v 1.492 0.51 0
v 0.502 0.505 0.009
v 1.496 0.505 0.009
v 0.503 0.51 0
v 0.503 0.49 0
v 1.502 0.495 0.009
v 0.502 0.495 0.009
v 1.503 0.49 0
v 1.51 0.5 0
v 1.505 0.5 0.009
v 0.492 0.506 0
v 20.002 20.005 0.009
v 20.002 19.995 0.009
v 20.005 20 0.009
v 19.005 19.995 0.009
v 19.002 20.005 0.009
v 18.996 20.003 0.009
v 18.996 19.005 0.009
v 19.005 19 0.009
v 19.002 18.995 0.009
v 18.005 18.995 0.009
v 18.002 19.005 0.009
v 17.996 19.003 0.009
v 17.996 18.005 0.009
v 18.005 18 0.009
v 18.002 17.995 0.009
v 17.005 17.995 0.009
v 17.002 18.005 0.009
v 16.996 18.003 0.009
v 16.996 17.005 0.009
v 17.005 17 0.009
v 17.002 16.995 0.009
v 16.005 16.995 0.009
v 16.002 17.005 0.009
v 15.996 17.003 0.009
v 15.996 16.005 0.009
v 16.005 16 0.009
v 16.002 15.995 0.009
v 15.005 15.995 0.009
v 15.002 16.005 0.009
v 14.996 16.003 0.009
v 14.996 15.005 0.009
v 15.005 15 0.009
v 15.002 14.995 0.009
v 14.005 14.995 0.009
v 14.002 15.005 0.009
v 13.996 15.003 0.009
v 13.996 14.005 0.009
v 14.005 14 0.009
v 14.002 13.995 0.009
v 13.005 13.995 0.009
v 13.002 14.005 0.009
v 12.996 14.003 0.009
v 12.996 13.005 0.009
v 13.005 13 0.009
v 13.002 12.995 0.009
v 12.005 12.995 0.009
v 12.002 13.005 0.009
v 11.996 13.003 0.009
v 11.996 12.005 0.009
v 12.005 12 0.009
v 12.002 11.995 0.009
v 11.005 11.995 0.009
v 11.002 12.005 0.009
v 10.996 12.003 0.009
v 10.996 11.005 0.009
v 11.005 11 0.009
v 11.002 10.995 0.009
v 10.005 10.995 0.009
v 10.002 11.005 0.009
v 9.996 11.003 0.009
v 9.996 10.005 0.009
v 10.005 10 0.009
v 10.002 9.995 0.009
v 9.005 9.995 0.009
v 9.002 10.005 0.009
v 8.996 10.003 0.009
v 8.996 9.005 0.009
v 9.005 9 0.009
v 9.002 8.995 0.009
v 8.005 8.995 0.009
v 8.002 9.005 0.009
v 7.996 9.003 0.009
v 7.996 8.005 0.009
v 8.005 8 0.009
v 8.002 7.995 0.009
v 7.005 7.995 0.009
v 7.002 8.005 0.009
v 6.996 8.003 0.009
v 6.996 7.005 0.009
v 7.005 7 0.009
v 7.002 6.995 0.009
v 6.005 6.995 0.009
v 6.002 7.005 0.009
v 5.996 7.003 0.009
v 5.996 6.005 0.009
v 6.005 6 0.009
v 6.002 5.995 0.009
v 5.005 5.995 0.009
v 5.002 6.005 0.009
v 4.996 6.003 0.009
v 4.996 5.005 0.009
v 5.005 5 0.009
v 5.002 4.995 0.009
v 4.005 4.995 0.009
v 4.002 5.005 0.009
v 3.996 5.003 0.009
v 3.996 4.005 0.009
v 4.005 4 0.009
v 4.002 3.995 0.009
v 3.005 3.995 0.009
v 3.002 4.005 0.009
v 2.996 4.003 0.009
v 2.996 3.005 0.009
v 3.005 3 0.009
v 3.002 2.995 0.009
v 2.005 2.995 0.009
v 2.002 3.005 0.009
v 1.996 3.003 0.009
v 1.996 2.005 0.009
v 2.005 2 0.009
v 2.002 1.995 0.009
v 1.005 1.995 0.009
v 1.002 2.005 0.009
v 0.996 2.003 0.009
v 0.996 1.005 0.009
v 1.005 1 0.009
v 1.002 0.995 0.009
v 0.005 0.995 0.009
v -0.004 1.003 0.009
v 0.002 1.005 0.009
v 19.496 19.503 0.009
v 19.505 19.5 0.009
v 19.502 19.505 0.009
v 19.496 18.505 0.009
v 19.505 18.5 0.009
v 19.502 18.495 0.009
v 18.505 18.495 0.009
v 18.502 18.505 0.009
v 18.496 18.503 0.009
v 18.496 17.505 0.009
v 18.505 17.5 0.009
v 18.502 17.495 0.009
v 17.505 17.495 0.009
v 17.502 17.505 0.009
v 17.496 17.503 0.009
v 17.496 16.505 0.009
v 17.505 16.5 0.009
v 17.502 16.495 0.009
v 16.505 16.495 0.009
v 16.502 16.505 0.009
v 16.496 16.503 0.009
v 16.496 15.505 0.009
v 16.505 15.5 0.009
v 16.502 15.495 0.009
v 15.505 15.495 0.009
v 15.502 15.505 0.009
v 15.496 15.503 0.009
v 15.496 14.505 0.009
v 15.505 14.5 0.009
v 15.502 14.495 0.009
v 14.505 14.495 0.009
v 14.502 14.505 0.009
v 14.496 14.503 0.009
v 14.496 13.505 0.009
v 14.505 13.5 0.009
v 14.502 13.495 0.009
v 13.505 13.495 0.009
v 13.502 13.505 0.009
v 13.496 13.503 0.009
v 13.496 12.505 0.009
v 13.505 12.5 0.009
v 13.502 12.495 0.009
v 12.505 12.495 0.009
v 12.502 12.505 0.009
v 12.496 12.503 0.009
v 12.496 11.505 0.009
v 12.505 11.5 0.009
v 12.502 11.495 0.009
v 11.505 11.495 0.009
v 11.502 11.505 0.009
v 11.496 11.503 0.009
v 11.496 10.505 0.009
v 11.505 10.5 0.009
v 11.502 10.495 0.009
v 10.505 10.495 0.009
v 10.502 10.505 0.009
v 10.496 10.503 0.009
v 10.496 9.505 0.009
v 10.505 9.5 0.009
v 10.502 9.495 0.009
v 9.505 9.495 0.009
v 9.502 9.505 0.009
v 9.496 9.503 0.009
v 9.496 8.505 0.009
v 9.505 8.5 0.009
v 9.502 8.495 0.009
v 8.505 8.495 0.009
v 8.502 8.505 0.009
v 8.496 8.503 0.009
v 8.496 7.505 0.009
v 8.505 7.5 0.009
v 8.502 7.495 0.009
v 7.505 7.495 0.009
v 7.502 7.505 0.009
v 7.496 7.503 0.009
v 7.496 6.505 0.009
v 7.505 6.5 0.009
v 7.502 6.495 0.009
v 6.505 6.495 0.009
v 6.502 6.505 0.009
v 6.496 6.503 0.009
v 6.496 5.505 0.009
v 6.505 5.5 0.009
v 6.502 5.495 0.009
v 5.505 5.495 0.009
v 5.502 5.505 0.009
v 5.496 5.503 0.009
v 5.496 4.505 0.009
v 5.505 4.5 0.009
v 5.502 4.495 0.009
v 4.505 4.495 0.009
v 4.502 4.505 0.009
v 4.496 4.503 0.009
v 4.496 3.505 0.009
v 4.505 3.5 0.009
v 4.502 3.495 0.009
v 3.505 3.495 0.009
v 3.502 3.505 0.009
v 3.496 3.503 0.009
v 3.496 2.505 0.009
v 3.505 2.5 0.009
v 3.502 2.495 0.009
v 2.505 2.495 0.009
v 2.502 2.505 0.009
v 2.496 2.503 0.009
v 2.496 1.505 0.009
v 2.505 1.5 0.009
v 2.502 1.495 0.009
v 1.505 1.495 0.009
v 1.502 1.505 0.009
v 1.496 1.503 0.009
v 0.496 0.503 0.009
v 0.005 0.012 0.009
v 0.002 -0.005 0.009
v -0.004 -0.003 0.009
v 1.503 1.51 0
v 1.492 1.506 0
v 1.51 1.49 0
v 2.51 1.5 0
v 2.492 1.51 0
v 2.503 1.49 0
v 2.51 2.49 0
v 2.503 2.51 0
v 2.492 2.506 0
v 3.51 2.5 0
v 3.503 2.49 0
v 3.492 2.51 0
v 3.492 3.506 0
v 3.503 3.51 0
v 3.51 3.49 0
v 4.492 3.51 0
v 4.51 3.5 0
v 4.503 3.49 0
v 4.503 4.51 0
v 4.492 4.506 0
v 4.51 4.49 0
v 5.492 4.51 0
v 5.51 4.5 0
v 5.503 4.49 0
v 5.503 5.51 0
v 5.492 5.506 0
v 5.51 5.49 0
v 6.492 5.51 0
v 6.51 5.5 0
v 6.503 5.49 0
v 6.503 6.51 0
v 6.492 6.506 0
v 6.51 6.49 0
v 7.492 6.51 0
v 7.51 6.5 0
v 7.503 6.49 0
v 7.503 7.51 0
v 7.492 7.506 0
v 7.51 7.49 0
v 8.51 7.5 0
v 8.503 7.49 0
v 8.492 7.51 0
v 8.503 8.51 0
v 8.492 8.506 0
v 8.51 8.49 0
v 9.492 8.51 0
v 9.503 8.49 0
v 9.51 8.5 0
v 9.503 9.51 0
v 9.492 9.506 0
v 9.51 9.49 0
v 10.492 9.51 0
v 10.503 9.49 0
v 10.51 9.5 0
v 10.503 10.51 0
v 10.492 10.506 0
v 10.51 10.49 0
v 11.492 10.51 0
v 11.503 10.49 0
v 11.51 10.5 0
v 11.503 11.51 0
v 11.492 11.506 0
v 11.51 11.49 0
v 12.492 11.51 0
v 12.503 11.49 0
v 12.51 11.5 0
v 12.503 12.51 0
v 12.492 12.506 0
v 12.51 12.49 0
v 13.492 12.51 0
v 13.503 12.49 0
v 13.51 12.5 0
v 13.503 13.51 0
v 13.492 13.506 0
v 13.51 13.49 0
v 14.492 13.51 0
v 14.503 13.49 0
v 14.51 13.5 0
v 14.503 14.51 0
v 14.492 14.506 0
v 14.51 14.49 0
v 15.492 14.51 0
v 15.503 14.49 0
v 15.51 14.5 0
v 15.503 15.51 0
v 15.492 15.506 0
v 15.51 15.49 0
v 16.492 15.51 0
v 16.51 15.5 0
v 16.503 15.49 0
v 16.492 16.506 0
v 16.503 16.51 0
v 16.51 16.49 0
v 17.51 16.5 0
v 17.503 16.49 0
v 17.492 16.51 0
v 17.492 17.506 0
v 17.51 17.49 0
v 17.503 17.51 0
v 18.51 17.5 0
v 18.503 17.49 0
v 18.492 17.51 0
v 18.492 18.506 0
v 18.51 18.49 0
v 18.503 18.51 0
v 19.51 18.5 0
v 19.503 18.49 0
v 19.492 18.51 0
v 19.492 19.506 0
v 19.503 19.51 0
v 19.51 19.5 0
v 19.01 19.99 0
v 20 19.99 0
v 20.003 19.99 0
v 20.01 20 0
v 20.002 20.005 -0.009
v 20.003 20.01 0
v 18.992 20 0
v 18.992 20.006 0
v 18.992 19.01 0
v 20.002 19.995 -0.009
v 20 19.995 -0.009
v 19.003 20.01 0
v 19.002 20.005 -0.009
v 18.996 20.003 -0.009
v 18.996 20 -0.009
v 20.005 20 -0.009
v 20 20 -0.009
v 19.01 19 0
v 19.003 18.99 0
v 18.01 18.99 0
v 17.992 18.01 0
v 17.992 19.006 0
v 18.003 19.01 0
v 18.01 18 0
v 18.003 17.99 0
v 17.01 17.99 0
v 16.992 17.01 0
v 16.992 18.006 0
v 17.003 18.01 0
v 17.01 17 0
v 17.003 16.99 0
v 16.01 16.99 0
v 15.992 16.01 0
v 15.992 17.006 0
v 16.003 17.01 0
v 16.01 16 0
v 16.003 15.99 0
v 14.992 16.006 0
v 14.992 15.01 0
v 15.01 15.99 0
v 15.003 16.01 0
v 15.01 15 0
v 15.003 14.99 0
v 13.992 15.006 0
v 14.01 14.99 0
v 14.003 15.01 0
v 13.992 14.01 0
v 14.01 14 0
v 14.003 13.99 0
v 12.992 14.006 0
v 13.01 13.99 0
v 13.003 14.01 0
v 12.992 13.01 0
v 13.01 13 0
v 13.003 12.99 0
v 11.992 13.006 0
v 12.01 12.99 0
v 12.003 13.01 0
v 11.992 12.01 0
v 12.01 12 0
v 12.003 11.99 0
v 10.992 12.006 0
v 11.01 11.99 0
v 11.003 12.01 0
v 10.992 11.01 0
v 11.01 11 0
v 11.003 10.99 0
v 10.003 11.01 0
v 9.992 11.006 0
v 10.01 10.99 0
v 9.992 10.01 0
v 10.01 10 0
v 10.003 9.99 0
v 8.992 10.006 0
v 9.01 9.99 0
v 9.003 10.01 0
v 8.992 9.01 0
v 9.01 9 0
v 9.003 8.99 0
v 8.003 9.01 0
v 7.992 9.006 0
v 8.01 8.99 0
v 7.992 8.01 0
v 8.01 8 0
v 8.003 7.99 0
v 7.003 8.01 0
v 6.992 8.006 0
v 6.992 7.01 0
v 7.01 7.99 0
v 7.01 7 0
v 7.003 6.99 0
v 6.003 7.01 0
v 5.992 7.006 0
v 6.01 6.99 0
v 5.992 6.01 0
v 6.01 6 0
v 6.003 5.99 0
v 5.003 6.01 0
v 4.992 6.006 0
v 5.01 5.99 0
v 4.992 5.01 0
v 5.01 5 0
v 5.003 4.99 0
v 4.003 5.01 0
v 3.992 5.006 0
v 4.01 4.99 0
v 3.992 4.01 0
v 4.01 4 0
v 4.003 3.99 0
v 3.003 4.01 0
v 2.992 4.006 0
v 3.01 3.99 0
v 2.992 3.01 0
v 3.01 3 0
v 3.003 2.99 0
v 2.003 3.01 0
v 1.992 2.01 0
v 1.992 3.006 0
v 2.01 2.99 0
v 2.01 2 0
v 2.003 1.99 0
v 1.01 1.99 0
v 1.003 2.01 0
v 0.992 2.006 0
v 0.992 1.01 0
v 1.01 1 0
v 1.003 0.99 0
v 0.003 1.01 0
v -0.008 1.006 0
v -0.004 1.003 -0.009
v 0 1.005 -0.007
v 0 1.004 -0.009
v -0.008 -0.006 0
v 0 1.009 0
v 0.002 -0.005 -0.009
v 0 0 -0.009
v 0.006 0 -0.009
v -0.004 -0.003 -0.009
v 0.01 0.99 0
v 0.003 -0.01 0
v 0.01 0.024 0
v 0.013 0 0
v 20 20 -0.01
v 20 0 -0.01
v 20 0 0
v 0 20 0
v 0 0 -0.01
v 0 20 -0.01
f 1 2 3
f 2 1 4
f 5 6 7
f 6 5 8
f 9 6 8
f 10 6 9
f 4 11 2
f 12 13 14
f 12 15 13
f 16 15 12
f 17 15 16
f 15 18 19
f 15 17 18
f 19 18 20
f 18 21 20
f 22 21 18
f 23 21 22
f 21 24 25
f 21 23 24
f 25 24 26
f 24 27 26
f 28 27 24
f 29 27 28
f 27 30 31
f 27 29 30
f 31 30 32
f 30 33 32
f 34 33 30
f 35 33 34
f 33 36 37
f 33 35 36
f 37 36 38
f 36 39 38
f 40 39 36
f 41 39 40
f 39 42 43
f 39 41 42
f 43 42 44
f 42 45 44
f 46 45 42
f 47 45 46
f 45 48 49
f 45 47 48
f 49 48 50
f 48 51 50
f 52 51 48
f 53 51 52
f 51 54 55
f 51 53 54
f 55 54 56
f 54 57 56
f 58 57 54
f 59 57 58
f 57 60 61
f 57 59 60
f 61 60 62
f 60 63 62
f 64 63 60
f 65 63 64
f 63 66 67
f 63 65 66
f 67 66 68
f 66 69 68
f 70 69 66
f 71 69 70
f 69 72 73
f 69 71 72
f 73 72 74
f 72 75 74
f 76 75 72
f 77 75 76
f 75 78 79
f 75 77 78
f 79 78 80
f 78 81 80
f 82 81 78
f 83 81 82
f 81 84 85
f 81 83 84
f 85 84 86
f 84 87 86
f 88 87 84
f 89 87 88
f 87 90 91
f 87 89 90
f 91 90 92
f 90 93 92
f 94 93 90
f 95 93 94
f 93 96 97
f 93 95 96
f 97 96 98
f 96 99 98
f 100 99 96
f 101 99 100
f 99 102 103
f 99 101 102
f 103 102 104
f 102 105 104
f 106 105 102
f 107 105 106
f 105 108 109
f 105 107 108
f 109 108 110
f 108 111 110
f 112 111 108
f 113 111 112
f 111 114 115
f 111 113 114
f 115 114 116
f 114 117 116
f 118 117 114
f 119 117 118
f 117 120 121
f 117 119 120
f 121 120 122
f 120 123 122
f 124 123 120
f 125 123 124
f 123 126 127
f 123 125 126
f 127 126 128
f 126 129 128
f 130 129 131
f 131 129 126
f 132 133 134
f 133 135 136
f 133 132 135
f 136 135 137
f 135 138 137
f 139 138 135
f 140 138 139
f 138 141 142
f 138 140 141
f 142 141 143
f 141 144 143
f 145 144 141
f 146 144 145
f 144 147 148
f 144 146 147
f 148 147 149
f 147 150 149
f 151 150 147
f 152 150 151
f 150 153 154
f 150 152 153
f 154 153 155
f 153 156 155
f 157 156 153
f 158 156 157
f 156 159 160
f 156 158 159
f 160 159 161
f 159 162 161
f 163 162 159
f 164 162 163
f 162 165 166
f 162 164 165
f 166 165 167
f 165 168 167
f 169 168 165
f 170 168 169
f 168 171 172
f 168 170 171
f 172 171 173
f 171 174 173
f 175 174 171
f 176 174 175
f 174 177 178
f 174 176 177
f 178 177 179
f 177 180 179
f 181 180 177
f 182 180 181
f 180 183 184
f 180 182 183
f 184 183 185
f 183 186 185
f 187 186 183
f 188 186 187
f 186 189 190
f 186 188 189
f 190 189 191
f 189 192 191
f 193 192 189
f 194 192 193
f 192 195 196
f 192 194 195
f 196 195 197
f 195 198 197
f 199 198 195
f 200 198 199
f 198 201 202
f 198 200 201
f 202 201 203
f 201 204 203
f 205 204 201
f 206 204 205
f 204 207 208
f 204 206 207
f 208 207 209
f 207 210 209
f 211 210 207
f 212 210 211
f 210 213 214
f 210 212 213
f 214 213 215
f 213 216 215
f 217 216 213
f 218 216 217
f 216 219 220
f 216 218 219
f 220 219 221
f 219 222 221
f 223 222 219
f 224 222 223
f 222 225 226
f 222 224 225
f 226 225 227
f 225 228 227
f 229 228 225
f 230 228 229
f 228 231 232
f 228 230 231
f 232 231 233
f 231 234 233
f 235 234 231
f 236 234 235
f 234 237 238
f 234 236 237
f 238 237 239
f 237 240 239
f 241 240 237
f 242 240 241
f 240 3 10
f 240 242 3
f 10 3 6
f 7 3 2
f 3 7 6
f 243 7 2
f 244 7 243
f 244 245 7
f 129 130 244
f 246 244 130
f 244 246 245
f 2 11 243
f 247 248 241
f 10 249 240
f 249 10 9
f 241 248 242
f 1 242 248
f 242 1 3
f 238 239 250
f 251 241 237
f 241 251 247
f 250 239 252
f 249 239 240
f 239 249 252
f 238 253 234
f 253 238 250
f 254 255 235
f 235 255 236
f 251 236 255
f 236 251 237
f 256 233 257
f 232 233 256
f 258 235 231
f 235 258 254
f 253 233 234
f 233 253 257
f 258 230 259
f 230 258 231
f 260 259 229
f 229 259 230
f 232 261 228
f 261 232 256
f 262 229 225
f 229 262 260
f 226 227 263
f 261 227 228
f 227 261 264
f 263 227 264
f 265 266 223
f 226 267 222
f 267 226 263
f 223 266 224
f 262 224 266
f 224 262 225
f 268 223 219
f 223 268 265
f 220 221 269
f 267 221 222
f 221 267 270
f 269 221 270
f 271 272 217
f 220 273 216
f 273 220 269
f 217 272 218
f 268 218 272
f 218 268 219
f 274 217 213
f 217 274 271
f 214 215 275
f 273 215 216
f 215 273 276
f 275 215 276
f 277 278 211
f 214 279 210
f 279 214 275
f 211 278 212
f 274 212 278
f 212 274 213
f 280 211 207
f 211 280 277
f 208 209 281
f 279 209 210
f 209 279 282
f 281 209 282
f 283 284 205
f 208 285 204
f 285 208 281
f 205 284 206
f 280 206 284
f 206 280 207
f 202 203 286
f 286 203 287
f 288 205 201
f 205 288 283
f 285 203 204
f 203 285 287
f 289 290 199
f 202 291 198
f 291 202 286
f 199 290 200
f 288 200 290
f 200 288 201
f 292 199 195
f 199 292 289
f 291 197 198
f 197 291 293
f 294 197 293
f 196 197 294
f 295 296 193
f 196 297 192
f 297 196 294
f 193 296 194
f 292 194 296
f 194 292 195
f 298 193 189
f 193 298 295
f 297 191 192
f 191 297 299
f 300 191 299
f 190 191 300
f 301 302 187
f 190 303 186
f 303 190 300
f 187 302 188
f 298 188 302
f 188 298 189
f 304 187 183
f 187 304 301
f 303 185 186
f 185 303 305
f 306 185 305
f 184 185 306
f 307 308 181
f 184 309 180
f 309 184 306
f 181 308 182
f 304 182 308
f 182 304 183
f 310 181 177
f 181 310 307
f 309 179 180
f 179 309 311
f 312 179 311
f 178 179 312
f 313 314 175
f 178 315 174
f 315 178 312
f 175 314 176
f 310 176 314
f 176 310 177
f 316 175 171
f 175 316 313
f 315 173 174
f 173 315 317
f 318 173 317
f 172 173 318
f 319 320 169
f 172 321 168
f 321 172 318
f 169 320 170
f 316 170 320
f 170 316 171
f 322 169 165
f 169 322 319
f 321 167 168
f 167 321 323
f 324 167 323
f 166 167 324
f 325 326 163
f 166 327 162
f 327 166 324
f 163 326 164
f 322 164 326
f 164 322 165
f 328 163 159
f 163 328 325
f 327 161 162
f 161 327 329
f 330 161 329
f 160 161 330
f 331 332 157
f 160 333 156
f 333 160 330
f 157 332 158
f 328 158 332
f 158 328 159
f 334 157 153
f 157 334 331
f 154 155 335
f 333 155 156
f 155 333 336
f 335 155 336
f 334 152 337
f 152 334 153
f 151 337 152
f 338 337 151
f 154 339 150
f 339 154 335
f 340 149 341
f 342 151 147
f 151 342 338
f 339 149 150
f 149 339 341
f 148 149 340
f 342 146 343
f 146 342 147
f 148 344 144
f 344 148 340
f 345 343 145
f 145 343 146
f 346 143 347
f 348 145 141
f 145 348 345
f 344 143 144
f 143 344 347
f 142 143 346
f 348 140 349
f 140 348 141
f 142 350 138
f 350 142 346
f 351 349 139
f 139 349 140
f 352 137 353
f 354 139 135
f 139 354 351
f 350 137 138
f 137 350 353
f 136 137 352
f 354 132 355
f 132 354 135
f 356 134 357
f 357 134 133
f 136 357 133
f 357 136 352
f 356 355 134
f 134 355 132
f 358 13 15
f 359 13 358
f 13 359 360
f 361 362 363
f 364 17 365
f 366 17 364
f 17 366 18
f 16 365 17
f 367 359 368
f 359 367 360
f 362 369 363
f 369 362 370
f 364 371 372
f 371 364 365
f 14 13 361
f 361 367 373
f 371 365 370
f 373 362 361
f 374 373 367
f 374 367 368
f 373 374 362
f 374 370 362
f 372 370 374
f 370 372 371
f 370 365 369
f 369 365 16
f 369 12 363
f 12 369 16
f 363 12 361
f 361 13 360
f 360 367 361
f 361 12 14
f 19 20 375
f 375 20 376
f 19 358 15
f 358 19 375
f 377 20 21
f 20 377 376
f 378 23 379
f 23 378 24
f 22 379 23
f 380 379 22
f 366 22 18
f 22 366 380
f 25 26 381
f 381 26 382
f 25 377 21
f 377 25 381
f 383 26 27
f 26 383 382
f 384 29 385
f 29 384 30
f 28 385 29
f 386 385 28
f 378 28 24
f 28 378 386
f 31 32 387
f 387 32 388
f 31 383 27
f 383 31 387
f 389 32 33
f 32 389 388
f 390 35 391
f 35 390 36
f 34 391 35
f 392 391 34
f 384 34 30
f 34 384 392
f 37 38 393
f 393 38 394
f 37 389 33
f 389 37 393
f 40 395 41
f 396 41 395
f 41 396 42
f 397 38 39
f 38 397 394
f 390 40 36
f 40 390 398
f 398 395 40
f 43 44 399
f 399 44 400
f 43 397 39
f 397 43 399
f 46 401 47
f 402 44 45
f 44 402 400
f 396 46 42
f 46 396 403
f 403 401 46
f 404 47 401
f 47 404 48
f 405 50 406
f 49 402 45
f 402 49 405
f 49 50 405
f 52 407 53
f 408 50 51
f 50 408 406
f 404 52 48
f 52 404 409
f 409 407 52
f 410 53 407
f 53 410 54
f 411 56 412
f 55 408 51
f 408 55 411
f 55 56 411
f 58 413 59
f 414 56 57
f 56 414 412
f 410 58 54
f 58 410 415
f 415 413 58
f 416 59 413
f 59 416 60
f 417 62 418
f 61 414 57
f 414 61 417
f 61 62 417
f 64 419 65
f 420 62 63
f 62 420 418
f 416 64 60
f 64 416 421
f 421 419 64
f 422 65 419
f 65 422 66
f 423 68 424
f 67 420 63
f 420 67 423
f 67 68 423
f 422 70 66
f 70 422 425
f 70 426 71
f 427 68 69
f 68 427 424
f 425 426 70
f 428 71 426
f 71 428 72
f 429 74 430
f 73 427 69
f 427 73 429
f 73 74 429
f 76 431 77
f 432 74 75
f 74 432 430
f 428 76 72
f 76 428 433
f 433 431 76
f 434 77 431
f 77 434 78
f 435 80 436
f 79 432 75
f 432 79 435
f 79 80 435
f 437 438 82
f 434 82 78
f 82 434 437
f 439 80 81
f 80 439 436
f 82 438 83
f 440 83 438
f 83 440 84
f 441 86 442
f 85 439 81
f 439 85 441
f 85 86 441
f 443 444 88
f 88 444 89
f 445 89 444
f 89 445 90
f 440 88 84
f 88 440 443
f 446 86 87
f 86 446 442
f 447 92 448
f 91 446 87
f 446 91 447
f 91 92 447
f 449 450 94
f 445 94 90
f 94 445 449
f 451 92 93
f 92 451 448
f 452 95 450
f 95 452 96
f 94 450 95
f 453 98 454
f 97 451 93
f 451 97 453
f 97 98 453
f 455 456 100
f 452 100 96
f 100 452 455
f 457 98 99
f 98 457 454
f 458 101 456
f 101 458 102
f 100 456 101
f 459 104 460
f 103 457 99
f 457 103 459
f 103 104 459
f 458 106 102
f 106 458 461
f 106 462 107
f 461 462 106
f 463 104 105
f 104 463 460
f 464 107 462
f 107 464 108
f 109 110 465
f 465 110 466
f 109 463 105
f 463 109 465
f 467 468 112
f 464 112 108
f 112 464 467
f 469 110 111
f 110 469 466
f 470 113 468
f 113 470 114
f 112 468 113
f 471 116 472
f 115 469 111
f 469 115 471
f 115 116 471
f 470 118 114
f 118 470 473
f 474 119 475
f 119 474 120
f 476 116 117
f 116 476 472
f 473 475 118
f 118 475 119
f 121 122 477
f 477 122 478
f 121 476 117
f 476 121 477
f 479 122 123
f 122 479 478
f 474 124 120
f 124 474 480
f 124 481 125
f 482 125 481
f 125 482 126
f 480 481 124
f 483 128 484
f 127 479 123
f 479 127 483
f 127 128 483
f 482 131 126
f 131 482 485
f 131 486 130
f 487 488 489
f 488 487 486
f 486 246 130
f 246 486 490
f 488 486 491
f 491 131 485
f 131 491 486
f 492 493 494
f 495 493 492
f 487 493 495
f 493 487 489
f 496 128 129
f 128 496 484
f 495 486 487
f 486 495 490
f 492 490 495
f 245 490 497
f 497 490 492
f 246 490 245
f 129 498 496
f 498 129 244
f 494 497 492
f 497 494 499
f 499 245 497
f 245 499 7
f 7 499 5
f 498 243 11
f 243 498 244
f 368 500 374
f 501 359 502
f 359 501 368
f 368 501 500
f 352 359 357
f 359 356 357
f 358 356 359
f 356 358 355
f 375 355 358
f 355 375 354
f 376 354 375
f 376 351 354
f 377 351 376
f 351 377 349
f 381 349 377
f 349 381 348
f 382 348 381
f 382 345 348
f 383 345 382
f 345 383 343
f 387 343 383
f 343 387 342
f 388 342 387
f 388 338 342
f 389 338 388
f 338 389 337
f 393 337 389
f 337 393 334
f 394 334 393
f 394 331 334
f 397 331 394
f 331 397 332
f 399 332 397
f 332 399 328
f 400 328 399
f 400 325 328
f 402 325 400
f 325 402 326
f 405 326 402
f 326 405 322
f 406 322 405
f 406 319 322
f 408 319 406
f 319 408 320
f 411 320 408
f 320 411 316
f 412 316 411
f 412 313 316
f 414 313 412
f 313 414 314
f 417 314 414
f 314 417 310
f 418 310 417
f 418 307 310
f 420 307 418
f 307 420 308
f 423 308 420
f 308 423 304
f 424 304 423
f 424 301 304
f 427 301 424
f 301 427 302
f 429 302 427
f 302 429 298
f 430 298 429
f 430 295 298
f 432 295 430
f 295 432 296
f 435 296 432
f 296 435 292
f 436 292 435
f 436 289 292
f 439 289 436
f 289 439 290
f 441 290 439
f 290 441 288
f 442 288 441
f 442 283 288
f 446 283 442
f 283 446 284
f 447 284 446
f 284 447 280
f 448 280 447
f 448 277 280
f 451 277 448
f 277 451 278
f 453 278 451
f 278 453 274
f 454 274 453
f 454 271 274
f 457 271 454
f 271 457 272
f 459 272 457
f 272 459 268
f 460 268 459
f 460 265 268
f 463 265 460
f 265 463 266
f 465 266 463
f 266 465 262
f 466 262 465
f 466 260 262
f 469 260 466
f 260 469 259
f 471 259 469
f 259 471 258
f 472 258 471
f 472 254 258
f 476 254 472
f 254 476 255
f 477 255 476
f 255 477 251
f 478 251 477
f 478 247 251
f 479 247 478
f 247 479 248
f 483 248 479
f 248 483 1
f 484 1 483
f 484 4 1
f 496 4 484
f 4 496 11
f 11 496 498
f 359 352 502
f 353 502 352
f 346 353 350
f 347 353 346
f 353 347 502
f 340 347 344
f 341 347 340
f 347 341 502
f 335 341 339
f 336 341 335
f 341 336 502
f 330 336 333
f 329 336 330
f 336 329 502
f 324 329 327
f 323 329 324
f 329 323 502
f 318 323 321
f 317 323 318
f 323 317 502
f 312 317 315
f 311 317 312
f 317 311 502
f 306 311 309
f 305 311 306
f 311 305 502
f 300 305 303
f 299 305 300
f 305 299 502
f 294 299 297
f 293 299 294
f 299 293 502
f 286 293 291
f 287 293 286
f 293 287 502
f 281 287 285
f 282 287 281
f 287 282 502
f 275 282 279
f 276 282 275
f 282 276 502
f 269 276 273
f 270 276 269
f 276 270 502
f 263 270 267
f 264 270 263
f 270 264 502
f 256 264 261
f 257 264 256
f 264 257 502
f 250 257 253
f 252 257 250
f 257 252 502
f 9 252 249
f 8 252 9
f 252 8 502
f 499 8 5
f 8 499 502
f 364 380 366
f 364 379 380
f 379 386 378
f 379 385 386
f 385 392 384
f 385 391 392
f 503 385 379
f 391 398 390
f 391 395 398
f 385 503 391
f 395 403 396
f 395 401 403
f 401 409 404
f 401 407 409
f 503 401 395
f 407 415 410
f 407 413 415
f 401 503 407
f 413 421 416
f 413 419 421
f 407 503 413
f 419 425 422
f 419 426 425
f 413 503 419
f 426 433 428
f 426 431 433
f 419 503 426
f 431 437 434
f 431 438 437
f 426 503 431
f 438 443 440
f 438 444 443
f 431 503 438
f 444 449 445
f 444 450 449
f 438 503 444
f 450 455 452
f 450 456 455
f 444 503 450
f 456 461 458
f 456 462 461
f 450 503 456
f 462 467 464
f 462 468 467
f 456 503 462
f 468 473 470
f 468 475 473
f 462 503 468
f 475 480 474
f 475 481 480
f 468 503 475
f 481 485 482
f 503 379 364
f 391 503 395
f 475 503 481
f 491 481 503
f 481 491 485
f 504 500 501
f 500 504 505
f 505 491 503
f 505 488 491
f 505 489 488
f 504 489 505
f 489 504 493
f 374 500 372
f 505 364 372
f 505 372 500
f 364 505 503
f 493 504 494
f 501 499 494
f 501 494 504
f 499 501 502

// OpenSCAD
hull(){
    translate([0.5, 0.5]) sphere(0.01);
    translate([1.5, 0.5]) sphere(0.01);
}
hull(){
    translate([1.5, 0.5]) sphere(0.01);
    translate([1.5, 1.5]) sphere(0.01);
}
hull(){
    translate([1.5, 1.5]) sphere(0.01);
    translate([2.5, 1.5]) sphere(0.01);
}
hull(){
    translate([2.5, 1.5]) sphere(0.01);
    translate([2.5, 2.5]) sphere(0.01);
}
hull(){
    translate([2.5, 2.5]) sphere(0.01);
    translate([3.5, 2.5]) sphere(0.01);
}
hull(){
    translate([3.5, 2.5]) sphere(0.01);
    translate([3.5, 3.5]) sphere(0.01);
}
hull(){
    translate([3.5, 3.5]) sphere(0.01);
    translate([4.5, 3.5]) sphere(0.01);
}
hull(){
    translate([4.5, 3.5]) sphere(0.01);
    translate([4.5, 4.5]) sphere(0.01);
}
hull(){
    translate([4.5, 4.5]) sphere(0.01);
    translate([5.5, 4.5]) sphere(0.01);
}
hull(){
    translate([5.5, 4.5]) sphere(0.01);
    translate([5.5, 5.5]) sphere(0.01);
}
hull(){
    translate([5.5, 5.5]) sphere(0.01);
    translate([6.5, 5.5]) sphere(0.01);
}
hull(){
    translate([6.5, 5.5]) sphere(0.01);
    translate([6.5, 6.5]) sphere(0.01);
}
hull(){
    translate([6.5, 6.5]) sphere(0.01);
    translate([7.5, 6.5]) sphere(0.01);
}
hull(){
    translate([7.5, 6.5]) sphere(0.01);
    translate([7.5, 7.5]) sphere(0.01);
}
hull(){
    translate([7.5, 7.5]) sphere(0.01);
    translate([8.5, 7.5]) sphere(0.01);
}
hull(){
    translate([8.5, 7.5]) sphere(0.01);
    translate([8.5, 8.5]) sphere(0.01);
}
hull(){
    translate([8.5, 8.5]) sphere(0.01);
    translate([9.5, 8.5]) sphere(0.01);
}
hull(){
    translate([9.5, 8.5]) sphere(0.01);
    translate([9.5, 9.5]) sphere(0.01);
}
hull(){
    translate([9.5, 9.5]) sphere(0.01);
    translate([10.5, 9.5]) sphere(0.01);
}
hull(){
    translate([10.5, 9.5]) sphere(0.01);
    translate([10.5, 10.5]) sphere(0.01);
}
hull(){
    translate([10.5, 10.5]) sphere(0.01);
    translate([11.5, 10.5]) sphere(0.01);
}
hull(){
    translate([11.5, 10.5]) sphere(0.01);
    translate([11.5, 11.5]) sphere(0.01);
}
hull(){
    translate([11.5, 11.5]) sphere(0.01);
    translate([12.5, 11.5]) sphere(0.01);
}
hull(){
    translate([12.5, 11.5]) sphere(0.01);
    translate([12.5, 12.5]) sphere(0.01);
}
hull(){
    translate([12.5, 12.5]) sphere(0.01);
    translate([13.5, 12.5]) sphere(0.01);
}
hull(){
    translate([13.5, 12.5]) sphere(0.01);
    translate([13.5, 13.5]) sphere(0.01);
}
hull(){
    translate([13.5, 13.5]) sphere(0.01);
    translate([14.5, 13.5]) sphere(0.01);
}
hull(){
    translate([14.5, 13.5]) sphere(0.01);
    translate([14.5, 14.5]) sphere(0.01);
}
hull(){
    translate([14.5, 14.5]) sphere(0.01);
    translate([15.5, 14.5]) sphere(0.01);
}
hull(){
    translate([15.5, 14.5]) sphere(0.01);
    translate([15.5, 15.5]) sphere(0.01);
}
hull(){
    translate([15.5, 15.5]) sphere(0.01);
    translate([16.5, 15.5]) sphere(0.01);
}
hull(){
    translate([16.5, 15.5]) sphere(0.01);
    translate([16.5, 16.5]) sphere(0.01);
}
hull(){
    translate([16.5, 16.5]) sphere(0.01);
    translate([17.5, 16.5]) sphere(0.01);
}
hull(){
    translate([17.5, 16.5]) sphere(0.01);
    translate([17.5, 17.5]) sphere(0.01);
}
hull(){
    translate([17.5, 17.5]) sphere(0.01);
    translate([18.5, 17.5]) sphere(0.01);
}
hull(){
    translate([18.5, 17.5]) sphere(0.01);
    translate([18.5, 18.5]) sphere(0.01);
}
hull(){
    translate([18.5, 18.5]) sphere(0.01);
    translate([19.5, 18.5]) sphere(0.01);
}
hull(){
    translate([19.5, 18.5]) sphere(0.01);
    translate([19.5, 19.5]) sphere(0.01);
}
hull(){
    translate([20.0, 20.0]) sphere(0.01);
    translate([19.0, 20.0]) sphere(0.01);
}
hull(){
    translate([19.0, 20.0]) sphere(0.01);
    translate([19.0, 19.0]) sphere(0.01);
}
hull(){
    translate([19.0, 19.0]) sphere(0.01);
    translate([18.0, 19.0]) sphere(0.01);
}
hull(){
    translate([18.0, 19.0]) sphere(0.01);
    translate([18.0, 18.0]) sphere(0.01);
}
hull(){
    translate([18.0, 18.0]) sphere(0.01);
    translate([17.0, 18.0]) sphere(0.01);
}
hull(){
    translate([17.0, 18.0]) sphere(0.01);
    translate([17.0, 17.0]) sphere(0.01);
}
hull(){
    translate([17.0, 17.0]) sphere(0.01);
    translate([16.0, 17.0]) sphere(0.01);
}
hull(){
    translate([16.0, 17.0]) sphere(0.01);
    translate([16.0, 16.0]) sphere(0.01);
}
hull(){
    translate([16.0, 16.0]) sphere(0.01);
    translate([15.0, 16.0]) sphere(0.01);
}
hull(){
    translate([15.0, 16.0]) sphere(0.01);
    translate([15.0, 15.0]) sphere(0.01);
}
hull(){
    translate([15.0, 15.0]) sphere(0.01);
    translate([14.0, 15.0]) sphere(0.01);
}
hull(){
    translate([14.0, 15.0]) sphere(0.01);
    translate([14.0, 14.0]) sphere(0.01);
}
hull(){
    translate([14.0, 14.0]) sphere(0.01);
    translate([13.0, 14.0]) sphere(0.01);
}
hull(){
    translate([13.0, 14.0]) sphere(0.01);
    translate([13.0, 13.0]) sphere(0.01);
}
hull(){
    translate([13.0, 13.0]) sphere(0.01);
    translate([12.0, 13.0]) sphere(0.01);
}
hull(){
    translate([12.0, 13.0]) sphere(0.01);
    translate([12.0, 12.0]) sphere(0.01);
}
hull(){
    translate([12.0, 12.0]) sphere(0.01);
    translate([11.0, 12.0]) sphere(0.01);
}
hull(){
    translate([11.0, 12.0]) sphere(0.01);
    translate([11.0, 11.0]) sphere(0.01);
}
hull(){
    translate([11.0, 11.0]) sphere(0.01);
    translate([10.0, 11.0]) sphere(0.01);
}
hull(){
    translate([10.0, 11.0]) sphere(0.01);
    translate([10.0, 10.0]) sphere(0.01);
}
hull(){
    translate([10.0, 10.0]) sphere(0.01);
    translate([9.0, 10.0]) sphere(0.01);
}
hull(){
    translate([9.0, 10.0]) sphere(0.01);
    translate([9.0, 9.0]) sphere(0.01);
}
hull(){
    translate([9.0, 9.0]) sphere(0.01);
    translate([8.0, 9.0]) sphere(0.01);
}
hull(){
    translate([8.0, 9.0]) sphere(0.01);
    translate([8.0, 8.0]) sphere(0.01);
}
hull(){
    translate([8.0, 8.0]) sphere(0.01);
    translate([7.0, 8.0]) sphere(0.01);
}
hull(){
    translate([7.0, 8.0]) sphere(0.01);
    translate([7.0, 7.0]) sphere(0.01);
}
hull(){
    translate([7.0, 7.0]) sphere(0.01);
    translate([6.0, 7.0]) sphere(0.01);
}
hull(){
    translate([6.0, 7.0]) sphere(0.01);
    translate([6.0, 6.0]) sphere(0.01);
}
hull(){
    translate([6.0, 6.0]) sphere(0.01);
    translate([5.0, 6.0]) sphere(0.01);
}
hull(){
    translate([5.0, 6.0]) sphere(0.01);
    translate([5.0, 5.0]) sphere(0.01);
}
hull(){
    translate([5.0, 5.0]) sphere(0.01);
    translate([4.0, 5.0]) sphere(0.01);
}
hull(){
    translate([4.0, 5.0]) sphere(0.01);
    translate([4.0, 4.0]) sphere(0.01);
}
hull(){
    translate([4.0, 4.0]) sphere(0.01);
    translate([3.0, 4.0]) sphere(0.01);
}
hull(){
    translate([3.0, 4.0]) sphere(0.01);
    translate([3.0, 3.0]) sphere(0.01);
}
hull(){
    translate([3.0, 3.0]) sphere(0.01);
    translate([2.0, 3.0]) sphere(0.01);
}
hull(){
    translate([2.0, 3.0]) sphere(0.01);
    translate([2.0, 2.0]) sphere(0.01);
}
hull(){
    translate([2.0, 2.0]) sphere(0.01);
    translate([1.0, 2.0]) sphere(0.01);
}
hull(){
    translate([1.0, 2.0]) sphere(0.01);
    translate([1.0, 1.0]) sphere(0.01);
}
hull(){
    translate([1.0, 1.0]) sphere(0.01);
    translate([0.0, 1.0]) sphere(0.01);
}
hull(){
    translate([0.0, 1.0]) sphere(0.01);
    translate([0.0, 0.0]) sphere(0.01);
}
hull(){
    translate([0.0, 0.0]) sphere(0.01);
    translate([0.5, 0.5]) sphere(0.01);
}
translate([0,0,-0.01]) color([0.1,0.1,0.1]) cube([20,20,0.01]);
